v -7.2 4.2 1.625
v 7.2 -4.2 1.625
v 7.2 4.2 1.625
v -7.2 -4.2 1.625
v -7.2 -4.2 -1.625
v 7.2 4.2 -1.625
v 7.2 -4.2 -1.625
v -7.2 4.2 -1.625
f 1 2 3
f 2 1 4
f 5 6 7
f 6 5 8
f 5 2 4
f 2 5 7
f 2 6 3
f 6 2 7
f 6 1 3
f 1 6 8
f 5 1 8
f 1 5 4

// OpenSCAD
$fn=50;

function ConnectorLength() = 14;
function ConnectorWidth() = 8; 
function ConnectorHeight() = 2.85;

//Note: each pin is approximately 2.25mm wide.  this is a 3 pin connector.

module ServoConnector(3dPrinterTolerance=.4){
	translate(-[(ConnectorLength()+3dPrinterTolerance)/2,(ConnectorWidth()+3dPrinterTolerance)/2,(ConnectorHeight()+3dPrinterTolerance)/2]){
		cube([ConnectorLength()+3dPrinterTolerance,ConnectorWidth()+3dPrinterTolerance,ConnectorHeight()+3dPrinterTolerance]);
	}
}

ServoConnector(.4);
